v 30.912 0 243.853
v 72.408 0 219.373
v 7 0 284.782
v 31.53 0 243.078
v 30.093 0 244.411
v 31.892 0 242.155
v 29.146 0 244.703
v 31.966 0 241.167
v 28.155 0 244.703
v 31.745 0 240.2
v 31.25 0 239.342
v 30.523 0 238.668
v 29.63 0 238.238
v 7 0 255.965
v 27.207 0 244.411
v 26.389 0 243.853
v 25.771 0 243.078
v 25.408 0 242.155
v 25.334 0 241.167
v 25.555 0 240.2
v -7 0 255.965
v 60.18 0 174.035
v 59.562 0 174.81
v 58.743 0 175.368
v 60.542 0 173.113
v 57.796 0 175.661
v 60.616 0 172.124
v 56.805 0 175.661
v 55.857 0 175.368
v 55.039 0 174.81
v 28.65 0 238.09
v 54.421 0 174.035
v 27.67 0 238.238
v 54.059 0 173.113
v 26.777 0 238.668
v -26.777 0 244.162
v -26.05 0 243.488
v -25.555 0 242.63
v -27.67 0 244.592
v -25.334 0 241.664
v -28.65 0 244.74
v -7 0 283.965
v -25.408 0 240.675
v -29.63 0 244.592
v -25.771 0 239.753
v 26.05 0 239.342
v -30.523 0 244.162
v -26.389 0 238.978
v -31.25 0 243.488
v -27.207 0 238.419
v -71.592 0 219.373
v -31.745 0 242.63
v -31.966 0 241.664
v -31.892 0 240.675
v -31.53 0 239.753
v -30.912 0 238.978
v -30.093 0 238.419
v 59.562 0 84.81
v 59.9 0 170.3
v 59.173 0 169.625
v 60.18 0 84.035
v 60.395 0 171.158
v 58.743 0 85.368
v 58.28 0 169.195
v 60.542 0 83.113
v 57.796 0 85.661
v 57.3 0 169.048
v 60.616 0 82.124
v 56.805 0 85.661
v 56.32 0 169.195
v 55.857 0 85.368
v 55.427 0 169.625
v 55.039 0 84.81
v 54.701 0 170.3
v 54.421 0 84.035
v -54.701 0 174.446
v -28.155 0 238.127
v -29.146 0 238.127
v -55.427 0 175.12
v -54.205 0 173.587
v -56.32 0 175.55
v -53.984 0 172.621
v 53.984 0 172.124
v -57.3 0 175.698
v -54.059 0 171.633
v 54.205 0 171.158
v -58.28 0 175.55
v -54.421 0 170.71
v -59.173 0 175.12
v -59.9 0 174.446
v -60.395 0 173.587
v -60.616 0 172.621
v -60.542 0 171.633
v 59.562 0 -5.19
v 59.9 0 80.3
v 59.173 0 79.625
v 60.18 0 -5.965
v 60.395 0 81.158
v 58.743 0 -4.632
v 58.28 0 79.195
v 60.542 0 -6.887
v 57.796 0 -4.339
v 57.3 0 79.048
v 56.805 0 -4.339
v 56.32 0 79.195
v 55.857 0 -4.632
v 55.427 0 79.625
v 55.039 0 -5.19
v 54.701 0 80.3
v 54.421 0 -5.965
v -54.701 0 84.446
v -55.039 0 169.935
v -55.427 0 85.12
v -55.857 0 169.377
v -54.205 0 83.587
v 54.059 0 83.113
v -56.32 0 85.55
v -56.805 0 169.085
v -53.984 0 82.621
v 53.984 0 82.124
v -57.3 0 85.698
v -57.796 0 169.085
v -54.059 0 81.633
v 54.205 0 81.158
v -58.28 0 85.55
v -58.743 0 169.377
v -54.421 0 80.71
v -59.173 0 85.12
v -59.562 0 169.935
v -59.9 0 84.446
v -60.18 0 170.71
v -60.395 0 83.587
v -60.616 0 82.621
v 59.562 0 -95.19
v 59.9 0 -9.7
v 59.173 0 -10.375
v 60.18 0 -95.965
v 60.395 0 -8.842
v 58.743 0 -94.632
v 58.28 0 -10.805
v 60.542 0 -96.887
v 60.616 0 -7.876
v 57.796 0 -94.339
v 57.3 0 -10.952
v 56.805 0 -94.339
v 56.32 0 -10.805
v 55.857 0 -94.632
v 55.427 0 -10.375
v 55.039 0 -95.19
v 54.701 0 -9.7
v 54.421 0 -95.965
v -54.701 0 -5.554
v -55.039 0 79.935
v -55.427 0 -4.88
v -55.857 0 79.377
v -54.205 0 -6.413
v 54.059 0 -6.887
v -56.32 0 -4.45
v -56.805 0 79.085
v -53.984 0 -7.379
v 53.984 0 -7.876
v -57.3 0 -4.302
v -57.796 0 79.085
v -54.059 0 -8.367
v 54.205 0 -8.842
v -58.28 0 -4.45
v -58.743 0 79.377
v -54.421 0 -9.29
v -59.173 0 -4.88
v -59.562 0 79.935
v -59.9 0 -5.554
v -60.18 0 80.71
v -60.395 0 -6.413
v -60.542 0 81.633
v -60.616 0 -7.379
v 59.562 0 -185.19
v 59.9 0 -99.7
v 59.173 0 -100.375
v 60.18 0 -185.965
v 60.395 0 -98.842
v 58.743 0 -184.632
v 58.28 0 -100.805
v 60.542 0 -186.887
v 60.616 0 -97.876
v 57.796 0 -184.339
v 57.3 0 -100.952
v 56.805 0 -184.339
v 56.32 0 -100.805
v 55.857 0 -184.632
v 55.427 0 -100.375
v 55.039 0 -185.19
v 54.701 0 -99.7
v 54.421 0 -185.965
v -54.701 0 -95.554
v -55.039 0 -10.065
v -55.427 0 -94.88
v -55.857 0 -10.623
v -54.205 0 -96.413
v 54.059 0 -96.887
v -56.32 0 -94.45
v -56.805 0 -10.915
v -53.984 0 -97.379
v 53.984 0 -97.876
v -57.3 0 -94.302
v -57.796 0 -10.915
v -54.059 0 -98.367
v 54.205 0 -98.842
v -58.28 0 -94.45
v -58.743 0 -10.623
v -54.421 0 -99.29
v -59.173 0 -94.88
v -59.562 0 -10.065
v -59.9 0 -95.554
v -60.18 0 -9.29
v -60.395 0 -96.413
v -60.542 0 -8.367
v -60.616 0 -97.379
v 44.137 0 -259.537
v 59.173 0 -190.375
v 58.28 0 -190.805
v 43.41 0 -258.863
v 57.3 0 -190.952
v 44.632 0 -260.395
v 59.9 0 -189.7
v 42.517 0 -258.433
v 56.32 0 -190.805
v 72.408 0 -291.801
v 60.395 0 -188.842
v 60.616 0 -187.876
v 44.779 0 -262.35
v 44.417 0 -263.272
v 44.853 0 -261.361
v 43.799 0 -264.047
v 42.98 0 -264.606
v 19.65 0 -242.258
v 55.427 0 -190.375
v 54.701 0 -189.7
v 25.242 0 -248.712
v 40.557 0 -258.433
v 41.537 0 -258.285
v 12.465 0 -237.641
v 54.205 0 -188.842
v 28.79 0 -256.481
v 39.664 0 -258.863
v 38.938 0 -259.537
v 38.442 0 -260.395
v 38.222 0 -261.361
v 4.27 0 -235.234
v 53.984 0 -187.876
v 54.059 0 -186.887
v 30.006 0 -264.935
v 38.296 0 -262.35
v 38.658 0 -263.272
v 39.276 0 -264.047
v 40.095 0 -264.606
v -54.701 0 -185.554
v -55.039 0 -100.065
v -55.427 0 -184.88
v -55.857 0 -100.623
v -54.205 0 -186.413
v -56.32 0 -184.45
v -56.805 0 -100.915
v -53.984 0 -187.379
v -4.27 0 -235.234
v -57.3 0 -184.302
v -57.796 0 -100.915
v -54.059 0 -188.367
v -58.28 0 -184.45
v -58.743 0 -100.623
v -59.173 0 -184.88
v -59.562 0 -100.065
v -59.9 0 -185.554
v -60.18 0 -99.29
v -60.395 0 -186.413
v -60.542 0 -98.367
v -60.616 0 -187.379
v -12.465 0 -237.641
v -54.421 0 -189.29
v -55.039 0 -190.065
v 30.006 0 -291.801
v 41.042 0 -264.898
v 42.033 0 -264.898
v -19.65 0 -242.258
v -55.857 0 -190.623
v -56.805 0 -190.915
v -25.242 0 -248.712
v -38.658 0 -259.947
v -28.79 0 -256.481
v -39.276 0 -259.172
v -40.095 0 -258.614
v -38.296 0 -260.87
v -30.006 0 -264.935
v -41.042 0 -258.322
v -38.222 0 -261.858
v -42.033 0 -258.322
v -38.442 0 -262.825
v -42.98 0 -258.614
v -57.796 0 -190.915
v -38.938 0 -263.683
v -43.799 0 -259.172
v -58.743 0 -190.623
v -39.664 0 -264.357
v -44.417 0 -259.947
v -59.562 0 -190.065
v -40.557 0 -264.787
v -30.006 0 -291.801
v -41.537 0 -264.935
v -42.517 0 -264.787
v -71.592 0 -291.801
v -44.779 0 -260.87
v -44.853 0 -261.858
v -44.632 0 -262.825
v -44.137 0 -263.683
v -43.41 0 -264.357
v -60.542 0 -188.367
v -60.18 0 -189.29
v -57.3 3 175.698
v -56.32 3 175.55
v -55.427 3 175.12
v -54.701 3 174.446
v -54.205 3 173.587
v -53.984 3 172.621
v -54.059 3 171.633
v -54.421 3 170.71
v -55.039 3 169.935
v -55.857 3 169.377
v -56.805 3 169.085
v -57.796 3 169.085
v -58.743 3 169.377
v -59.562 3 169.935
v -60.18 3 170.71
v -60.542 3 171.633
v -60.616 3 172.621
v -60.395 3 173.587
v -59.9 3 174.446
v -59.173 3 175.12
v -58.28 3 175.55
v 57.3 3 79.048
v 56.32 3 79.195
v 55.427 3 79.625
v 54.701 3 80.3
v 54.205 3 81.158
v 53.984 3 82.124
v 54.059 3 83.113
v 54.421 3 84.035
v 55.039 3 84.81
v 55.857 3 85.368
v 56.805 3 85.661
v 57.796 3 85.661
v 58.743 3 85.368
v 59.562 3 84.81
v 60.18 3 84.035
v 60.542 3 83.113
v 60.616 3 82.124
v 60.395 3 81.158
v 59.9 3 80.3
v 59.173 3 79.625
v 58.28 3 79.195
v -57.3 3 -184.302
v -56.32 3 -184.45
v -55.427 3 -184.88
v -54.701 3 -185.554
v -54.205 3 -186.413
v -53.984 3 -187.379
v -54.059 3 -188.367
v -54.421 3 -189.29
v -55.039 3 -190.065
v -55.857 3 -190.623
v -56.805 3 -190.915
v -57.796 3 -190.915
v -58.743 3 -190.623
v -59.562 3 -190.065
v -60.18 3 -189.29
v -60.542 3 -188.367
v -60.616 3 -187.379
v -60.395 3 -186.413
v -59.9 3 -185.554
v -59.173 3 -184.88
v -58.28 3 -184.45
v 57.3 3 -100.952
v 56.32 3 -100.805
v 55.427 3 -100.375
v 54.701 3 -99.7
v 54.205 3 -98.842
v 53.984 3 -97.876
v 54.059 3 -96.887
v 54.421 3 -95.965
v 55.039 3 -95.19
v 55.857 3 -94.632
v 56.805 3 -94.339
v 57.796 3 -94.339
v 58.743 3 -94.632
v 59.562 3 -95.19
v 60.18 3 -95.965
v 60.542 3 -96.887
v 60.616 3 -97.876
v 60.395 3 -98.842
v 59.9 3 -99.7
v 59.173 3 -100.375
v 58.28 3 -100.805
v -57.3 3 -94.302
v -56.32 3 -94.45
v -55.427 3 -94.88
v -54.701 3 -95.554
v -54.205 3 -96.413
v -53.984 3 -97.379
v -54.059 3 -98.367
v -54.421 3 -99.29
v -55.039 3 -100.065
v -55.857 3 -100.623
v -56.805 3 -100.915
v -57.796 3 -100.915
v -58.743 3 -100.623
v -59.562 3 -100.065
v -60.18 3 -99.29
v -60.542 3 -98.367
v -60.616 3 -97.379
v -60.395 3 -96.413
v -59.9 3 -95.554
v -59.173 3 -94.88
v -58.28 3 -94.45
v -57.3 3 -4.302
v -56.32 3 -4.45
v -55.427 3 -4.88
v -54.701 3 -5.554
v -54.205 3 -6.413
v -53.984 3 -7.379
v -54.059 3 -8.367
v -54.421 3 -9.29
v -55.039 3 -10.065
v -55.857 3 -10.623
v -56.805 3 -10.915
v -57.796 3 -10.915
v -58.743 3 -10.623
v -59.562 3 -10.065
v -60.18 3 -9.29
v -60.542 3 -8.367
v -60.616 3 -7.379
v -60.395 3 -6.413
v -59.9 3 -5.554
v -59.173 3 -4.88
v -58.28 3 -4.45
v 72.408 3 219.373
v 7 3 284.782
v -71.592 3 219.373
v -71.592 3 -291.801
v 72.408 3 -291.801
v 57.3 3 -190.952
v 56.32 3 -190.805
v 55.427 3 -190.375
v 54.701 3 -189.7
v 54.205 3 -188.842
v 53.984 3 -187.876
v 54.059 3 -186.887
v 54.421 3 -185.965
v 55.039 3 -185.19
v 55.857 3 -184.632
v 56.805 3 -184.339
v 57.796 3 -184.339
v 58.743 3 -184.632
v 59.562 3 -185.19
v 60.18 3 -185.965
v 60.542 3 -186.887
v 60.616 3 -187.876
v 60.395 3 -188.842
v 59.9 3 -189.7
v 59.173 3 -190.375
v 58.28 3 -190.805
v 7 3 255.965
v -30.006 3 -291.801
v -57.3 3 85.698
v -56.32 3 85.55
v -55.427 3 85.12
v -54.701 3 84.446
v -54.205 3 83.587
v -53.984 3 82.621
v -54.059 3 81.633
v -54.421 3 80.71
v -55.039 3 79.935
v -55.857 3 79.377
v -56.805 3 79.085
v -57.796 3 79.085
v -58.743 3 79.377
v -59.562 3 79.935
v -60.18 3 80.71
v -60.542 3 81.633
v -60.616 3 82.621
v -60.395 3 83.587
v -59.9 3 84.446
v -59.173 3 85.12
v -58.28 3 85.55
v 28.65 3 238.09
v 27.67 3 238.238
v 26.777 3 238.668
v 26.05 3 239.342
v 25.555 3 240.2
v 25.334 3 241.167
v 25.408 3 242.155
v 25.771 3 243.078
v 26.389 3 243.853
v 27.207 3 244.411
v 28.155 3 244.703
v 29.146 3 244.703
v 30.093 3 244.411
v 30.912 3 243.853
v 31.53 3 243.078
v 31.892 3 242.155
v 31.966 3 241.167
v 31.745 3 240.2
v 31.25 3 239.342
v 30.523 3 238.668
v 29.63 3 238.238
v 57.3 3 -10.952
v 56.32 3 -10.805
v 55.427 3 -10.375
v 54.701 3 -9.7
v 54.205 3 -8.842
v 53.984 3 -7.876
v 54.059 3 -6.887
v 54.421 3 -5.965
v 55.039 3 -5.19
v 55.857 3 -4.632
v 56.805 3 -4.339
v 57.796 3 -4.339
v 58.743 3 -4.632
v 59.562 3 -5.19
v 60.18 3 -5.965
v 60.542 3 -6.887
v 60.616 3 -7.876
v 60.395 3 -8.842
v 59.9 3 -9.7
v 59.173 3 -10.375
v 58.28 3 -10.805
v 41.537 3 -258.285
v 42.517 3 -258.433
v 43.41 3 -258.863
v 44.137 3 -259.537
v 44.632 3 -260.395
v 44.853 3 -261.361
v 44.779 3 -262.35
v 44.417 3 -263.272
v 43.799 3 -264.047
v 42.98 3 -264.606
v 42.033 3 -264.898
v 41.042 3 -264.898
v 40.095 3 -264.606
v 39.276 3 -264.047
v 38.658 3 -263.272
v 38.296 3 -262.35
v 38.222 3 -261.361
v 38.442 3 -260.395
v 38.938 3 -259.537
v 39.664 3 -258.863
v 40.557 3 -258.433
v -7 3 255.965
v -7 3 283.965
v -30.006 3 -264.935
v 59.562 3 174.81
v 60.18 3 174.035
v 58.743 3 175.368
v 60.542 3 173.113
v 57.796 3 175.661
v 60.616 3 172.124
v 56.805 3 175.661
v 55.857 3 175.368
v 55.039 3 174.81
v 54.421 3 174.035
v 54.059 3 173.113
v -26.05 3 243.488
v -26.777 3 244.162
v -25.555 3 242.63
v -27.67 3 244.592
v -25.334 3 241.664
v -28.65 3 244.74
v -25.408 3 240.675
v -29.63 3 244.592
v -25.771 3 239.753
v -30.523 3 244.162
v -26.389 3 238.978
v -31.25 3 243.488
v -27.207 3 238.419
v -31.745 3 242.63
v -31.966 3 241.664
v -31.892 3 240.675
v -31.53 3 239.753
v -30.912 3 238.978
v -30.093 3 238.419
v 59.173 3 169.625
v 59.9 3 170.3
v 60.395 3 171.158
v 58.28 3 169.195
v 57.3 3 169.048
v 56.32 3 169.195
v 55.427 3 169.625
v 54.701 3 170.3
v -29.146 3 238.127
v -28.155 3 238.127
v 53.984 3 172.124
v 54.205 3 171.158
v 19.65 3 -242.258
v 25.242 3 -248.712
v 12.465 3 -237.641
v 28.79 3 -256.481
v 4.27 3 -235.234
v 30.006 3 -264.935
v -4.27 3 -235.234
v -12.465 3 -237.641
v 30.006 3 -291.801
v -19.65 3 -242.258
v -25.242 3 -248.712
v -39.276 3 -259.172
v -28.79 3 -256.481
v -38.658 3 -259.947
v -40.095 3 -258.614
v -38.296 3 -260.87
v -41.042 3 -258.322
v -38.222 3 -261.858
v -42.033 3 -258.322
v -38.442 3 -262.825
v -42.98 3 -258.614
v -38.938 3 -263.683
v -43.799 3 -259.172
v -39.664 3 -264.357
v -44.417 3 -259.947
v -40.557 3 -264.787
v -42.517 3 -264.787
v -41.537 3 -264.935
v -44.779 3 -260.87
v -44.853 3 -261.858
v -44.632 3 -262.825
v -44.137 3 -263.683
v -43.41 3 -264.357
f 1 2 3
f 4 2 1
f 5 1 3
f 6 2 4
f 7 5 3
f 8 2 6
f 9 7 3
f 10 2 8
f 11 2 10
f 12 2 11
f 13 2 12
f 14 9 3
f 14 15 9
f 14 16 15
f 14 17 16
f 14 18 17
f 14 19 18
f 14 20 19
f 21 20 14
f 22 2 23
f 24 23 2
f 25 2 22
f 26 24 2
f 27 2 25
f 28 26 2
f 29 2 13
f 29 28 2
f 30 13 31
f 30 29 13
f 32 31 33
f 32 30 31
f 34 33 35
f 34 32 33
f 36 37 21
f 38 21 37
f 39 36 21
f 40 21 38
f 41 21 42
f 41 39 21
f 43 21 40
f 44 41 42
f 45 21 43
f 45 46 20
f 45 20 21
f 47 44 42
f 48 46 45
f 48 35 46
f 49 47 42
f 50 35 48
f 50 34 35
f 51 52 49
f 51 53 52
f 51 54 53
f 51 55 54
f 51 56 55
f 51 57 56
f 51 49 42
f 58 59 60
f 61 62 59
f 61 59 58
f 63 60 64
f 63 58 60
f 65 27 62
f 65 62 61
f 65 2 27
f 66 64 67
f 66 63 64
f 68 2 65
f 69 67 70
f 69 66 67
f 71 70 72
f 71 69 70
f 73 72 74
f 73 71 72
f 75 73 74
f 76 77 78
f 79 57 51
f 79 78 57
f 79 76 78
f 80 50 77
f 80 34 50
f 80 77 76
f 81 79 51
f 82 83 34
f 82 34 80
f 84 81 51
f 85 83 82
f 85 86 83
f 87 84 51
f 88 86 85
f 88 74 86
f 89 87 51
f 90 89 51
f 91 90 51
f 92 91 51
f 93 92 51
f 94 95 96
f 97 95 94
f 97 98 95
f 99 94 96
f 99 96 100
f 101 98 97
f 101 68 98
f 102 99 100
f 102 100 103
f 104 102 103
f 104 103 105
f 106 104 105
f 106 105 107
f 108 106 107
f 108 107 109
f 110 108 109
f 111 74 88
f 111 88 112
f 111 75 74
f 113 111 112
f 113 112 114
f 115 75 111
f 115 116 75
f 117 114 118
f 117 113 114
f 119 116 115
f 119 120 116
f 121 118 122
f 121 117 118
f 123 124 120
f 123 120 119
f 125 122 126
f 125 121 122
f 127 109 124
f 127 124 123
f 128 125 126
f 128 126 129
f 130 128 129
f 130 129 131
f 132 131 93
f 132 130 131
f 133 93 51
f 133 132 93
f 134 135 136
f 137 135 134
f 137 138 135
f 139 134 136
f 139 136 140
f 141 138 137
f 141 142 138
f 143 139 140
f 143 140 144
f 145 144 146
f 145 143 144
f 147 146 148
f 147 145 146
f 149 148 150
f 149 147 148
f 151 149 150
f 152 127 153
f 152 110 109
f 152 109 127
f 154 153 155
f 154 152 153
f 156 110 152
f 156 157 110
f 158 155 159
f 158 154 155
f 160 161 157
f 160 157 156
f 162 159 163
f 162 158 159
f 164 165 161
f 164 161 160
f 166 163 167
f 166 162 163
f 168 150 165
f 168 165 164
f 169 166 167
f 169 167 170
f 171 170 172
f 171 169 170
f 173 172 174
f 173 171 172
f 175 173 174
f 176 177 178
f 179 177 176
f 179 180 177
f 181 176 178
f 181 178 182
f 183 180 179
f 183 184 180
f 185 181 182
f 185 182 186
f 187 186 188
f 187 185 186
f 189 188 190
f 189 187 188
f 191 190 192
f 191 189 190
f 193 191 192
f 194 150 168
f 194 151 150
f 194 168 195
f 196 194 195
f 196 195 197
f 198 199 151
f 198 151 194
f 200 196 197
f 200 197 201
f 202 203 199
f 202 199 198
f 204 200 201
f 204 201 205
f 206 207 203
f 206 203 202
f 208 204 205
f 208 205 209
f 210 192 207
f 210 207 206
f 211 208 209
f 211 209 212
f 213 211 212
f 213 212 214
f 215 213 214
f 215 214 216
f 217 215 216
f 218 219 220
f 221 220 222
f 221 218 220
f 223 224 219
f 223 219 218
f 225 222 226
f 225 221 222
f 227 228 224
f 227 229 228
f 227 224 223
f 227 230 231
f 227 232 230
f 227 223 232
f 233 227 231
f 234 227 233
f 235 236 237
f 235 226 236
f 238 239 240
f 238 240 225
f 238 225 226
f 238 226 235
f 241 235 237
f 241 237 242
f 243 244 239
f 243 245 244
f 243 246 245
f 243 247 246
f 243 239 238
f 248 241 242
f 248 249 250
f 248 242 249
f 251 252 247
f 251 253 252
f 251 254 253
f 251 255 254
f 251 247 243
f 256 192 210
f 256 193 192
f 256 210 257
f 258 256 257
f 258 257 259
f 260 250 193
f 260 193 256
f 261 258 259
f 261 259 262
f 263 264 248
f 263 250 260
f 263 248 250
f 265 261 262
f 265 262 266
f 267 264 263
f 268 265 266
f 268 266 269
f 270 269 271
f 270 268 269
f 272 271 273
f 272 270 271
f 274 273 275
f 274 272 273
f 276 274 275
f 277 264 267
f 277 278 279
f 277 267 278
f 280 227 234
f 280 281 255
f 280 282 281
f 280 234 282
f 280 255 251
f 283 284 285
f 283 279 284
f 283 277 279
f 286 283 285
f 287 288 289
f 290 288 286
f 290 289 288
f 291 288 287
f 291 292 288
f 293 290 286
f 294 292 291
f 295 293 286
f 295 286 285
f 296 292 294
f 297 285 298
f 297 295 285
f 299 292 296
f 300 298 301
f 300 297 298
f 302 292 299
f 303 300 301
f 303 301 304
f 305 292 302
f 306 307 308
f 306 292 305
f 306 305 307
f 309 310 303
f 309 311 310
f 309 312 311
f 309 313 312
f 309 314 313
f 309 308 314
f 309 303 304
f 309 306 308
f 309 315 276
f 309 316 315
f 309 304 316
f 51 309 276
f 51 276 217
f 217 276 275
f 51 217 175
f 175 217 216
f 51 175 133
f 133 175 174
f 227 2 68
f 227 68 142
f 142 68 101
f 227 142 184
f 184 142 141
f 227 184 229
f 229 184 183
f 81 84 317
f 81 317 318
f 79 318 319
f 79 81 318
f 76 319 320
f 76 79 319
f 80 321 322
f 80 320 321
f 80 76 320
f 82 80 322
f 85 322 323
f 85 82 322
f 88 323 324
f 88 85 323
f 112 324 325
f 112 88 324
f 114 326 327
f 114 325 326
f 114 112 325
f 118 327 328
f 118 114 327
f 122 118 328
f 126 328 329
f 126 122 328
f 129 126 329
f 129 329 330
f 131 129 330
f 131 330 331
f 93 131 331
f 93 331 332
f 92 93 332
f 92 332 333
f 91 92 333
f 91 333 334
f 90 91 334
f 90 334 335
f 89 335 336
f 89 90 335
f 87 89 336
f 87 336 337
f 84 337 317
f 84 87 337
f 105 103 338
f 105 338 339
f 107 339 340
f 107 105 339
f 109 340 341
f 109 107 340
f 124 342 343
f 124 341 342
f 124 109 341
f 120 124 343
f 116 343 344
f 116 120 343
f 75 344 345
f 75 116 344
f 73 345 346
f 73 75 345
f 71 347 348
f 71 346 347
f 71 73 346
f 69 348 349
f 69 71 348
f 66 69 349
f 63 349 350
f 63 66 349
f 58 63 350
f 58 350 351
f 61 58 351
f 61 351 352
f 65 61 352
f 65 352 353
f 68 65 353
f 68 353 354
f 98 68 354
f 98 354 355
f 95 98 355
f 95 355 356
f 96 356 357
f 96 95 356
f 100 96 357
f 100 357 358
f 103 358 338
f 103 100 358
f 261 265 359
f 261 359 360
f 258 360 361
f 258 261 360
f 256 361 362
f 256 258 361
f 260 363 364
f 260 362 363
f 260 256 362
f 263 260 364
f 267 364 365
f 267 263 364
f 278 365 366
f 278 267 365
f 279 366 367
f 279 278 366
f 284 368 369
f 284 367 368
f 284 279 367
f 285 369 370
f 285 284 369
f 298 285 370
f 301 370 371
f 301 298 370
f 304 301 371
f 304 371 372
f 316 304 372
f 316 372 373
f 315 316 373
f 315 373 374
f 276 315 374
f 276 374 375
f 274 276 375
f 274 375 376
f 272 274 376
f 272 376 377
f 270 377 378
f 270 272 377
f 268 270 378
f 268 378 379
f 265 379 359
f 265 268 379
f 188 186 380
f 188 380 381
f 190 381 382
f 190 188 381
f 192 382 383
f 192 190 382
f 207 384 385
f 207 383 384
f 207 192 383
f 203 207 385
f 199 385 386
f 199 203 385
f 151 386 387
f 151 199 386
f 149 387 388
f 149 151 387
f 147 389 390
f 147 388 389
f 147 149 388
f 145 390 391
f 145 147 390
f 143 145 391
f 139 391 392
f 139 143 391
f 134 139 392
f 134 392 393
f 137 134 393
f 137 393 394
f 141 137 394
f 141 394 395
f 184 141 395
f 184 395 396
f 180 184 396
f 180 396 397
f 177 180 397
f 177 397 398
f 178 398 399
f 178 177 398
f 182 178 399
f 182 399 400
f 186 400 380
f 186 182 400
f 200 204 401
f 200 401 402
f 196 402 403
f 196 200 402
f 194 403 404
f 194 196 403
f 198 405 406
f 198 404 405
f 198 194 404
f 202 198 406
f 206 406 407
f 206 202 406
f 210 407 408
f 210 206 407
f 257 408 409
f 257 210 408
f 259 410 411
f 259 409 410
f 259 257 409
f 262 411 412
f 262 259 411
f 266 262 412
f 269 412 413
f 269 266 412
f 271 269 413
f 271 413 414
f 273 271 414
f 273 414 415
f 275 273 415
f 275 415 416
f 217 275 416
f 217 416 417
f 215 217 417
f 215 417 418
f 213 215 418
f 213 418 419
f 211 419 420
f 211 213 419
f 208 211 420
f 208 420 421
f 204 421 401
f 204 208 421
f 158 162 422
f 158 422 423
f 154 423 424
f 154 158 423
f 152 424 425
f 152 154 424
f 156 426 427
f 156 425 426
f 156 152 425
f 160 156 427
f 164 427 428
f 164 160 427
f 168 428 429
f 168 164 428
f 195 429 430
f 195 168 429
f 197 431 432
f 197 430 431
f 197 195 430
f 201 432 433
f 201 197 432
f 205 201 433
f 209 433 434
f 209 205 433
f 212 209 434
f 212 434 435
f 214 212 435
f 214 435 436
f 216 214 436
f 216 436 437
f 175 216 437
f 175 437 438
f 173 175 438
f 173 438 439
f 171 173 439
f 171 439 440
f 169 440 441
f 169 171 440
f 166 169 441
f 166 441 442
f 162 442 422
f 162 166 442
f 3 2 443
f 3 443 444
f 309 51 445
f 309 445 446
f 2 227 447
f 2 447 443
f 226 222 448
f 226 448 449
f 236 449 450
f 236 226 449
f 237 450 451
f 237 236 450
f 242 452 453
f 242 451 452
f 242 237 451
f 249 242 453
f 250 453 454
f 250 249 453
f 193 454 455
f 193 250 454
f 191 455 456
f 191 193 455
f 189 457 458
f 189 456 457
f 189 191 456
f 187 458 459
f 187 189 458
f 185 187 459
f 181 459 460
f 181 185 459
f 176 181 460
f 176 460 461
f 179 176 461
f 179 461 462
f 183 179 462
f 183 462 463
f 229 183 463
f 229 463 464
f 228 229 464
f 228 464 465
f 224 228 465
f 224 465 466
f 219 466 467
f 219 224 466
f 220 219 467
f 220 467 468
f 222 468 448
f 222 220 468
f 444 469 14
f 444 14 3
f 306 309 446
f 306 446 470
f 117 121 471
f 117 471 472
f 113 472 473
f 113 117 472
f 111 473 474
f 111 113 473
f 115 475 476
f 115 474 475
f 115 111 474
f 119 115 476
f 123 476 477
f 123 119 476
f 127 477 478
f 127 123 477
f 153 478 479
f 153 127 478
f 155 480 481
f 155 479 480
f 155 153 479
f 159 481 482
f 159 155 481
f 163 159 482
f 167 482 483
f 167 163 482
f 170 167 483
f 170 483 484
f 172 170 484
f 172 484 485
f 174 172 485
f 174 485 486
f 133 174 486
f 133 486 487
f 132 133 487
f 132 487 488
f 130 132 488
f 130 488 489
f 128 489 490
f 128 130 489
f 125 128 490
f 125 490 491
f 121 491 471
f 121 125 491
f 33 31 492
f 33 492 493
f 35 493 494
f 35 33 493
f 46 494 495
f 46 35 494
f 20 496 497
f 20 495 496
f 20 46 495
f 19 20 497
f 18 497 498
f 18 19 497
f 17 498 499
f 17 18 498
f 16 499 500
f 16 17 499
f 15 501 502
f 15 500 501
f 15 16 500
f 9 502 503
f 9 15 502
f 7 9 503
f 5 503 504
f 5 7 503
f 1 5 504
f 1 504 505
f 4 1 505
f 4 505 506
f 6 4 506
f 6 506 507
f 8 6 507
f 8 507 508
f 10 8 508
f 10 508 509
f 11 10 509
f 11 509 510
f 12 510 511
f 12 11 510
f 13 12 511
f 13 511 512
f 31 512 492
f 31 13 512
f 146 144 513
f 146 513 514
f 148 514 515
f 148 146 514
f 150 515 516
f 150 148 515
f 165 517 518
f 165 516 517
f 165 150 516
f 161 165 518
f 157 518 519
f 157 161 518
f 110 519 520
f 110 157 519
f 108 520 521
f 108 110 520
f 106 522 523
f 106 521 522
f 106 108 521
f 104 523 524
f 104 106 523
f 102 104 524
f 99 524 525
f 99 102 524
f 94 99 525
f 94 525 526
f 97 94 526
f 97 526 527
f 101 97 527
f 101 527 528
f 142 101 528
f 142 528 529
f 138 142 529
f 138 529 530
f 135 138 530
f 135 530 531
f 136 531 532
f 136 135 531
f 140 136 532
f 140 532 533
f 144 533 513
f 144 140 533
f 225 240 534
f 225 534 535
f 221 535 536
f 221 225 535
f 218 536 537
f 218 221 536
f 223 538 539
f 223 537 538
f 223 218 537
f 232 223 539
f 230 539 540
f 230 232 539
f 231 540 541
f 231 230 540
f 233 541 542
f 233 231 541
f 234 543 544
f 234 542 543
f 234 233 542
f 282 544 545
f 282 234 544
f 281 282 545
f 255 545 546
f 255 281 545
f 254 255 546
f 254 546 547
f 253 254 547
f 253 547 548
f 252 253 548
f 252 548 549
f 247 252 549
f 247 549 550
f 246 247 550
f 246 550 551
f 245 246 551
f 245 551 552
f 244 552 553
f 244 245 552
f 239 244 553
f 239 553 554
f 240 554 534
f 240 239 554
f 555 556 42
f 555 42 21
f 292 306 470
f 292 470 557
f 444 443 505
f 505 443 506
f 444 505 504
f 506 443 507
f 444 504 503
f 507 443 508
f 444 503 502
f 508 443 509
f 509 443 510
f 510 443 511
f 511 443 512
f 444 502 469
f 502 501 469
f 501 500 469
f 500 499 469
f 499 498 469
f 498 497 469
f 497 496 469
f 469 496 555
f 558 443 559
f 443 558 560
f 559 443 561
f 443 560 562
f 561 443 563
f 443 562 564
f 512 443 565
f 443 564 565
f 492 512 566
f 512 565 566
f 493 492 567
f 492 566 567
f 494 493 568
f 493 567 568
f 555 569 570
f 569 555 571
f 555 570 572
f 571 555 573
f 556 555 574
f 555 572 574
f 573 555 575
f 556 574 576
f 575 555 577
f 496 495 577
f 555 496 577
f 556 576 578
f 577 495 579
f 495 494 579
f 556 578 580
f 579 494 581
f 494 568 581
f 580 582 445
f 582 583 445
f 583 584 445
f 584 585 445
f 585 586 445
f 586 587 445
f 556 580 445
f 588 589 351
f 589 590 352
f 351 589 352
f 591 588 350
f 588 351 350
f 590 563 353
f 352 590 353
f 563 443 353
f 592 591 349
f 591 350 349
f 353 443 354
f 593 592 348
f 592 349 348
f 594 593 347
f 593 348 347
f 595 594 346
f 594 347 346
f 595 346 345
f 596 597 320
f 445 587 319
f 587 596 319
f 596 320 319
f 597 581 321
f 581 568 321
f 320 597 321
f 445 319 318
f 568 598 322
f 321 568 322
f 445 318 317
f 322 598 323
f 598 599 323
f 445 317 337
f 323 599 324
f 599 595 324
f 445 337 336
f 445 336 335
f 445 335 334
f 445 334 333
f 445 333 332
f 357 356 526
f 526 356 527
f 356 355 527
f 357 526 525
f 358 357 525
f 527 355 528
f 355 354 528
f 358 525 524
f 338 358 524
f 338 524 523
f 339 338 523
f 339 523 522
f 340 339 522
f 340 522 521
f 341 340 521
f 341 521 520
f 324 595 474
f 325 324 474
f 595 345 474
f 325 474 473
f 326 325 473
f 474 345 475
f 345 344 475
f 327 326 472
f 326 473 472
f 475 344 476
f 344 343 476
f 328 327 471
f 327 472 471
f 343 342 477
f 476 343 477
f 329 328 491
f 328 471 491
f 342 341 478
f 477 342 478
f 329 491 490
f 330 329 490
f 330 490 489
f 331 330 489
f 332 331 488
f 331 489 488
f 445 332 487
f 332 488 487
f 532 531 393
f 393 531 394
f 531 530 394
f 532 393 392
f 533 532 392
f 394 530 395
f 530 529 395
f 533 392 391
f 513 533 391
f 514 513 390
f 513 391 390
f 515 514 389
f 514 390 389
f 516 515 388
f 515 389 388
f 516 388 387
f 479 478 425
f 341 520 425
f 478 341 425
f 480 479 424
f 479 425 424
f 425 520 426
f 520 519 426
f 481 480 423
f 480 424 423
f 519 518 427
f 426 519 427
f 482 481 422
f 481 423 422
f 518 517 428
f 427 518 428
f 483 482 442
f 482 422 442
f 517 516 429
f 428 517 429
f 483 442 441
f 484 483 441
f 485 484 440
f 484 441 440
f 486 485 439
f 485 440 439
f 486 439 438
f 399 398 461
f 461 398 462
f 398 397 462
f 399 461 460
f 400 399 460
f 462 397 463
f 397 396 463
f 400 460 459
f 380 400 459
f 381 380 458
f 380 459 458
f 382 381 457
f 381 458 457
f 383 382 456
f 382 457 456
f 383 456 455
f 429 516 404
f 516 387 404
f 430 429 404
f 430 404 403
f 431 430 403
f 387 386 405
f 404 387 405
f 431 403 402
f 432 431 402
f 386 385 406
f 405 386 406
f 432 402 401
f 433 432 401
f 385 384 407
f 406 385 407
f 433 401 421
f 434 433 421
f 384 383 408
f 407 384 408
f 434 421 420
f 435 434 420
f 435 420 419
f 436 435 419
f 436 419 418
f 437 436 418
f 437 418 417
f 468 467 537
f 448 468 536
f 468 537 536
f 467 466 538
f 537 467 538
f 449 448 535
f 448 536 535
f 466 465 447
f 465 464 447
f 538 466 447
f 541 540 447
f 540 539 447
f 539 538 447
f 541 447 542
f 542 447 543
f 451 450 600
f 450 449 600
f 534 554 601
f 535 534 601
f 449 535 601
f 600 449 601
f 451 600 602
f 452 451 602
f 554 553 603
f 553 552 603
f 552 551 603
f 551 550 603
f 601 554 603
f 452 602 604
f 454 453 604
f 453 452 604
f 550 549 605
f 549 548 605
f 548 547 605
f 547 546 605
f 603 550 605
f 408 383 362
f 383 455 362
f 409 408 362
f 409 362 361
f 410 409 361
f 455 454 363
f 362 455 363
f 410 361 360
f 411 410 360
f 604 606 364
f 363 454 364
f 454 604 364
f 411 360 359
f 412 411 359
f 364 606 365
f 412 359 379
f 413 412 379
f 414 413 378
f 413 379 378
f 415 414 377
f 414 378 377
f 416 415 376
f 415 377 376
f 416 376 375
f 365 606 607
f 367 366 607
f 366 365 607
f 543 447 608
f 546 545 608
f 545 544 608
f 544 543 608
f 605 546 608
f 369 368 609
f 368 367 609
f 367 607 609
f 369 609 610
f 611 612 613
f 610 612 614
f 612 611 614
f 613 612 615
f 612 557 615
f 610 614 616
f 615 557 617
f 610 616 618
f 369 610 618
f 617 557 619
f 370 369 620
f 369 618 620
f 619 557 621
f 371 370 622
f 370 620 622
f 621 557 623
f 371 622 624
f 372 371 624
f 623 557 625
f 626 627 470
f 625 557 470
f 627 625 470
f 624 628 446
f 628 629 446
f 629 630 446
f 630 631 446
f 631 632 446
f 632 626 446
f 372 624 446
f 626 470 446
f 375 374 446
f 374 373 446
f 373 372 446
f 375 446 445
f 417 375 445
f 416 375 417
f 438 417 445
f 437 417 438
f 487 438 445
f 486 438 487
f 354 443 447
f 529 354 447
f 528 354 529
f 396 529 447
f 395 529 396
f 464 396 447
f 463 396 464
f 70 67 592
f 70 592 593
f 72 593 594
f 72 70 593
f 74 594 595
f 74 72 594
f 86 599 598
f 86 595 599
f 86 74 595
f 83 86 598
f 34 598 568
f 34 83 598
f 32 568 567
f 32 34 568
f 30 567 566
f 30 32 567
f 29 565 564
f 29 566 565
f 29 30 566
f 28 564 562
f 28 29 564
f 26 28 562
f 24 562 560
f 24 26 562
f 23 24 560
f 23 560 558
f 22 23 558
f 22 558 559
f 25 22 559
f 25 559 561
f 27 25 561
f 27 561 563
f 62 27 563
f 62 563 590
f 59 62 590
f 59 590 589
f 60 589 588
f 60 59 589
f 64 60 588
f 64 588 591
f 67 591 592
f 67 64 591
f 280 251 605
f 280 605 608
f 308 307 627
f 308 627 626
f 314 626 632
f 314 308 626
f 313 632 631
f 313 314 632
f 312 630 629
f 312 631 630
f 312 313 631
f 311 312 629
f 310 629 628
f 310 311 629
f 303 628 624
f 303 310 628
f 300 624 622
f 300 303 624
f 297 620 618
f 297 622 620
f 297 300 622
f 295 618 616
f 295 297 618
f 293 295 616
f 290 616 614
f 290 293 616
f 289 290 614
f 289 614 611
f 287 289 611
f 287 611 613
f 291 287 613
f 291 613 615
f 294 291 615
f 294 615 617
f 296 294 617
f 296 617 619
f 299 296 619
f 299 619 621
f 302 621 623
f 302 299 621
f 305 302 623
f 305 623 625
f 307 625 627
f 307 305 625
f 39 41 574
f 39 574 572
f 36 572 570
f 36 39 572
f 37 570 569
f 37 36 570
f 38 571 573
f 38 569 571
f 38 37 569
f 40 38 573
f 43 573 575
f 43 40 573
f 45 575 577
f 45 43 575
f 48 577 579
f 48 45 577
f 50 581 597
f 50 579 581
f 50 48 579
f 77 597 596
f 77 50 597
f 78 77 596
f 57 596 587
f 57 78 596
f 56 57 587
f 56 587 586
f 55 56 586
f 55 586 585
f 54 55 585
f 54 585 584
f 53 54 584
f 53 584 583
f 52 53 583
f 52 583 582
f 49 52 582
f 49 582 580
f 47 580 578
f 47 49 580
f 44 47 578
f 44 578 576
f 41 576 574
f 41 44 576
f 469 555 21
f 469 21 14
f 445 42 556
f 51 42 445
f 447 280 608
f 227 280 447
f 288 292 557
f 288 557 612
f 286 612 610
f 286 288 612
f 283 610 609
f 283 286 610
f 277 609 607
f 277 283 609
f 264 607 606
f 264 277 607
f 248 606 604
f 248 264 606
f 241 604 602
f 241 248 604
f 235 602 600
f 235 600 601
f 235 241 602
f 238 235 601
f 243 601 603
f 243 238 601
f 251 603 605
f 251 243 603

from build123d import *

# Parameters (mm, degrees)
BOSS_EXTRUDE2_DEPTH     = 3
CUT_EXTRUDE1_DEPTH      = 301.665110986
CUT_EXTRUDE2_DEPTH      = 301.665110986
CUT_EXTRUDE2_DEPTH_BACK = 301.665110986
SKETCH5_R               = 3.325


with BuildPart() as part:
    # Sketch3 → Boss-Extrude2 (new body)
    with BuildSketch(Plane(origin=(0, 0, 0), x_dir=(1, 0, 0), z_dir=(0, 1, 0))):
        with BuildLine():
            Line((-71.592001125, 291.800526166), (-30.005764519, 291.800526166))
            Line((-30.005764519, 291.800526166), (-30.005764519, 264.934819646))
            ThreePointArc((-30.005764519, 264.934819646), (0, 234.929055126), (30.005764519, 264.934819646))
            Line((30.005764519, 264.934819646), (30.005764519, 291.800526166))
            Line((30.005764519, 291.800526166), (72.408299895, 291.800526166))
            Line((72.408299895, 291.800526166), (72.408299895, -219.373421964))
            Line((72.408299895, -219.373421964), (0.408149385, -291.373572474))
            Line((0.408149385, -291.373572474), (-71.592001125, -219.373421964))
            Line((-71.592001125, -219.373421964), (-71.592001125, 291.800526166))
        make_face()
    extrude(amount=BOSS_EXTRUDE2_DEPTH)

    # Sketch4 → Cut-Extrude1 (cut, through all)
    with BuildSketch(Plane(origin=(0, 3, 0), x_dir=(1, 0, 0), z_dir=(0, 1, 0))):
        Polygon((-7, -283.965423089), (-7, -255.965423089), (7, -255.965423089), (7, -284.781721859), (0.408149385, -291.373572474), align=None)
    extrude(amount=-CUT_EXTRUDE1_DEPTH, mode=Mode.SUBTRACT)

    # Sketch5 → Cut-Extrude2 (cut, two sides: drawn at the far end of the back side and taken through both)
    with BuildSketch(Plane(origin=(0, 3, 0), x_dir=(1, 0, 0), z_dir=(0, 1, 0)).offset(-CUT_EXTRUDE2_DEPTH_BACK)):
        with Locations(Location((-28.65007526, -241.415105099, 0), (0, 0, 270))):
            Circle(SKETCH5_R)
        with Locations(Location((-57.30015051, -172.372698109, 0), (0, 0, 270))):
            Circle(SKETCH5_R)
        with Locations(Location((-57.30015051, -82.372698109, 0), (0, 0, 270))):
            Circle(SKETCH5_R)
        with Locations(Location((-57.30015051, 7.627301891, 0), (0, 0, 270))):
            Circle(SKETCH5_R)
        with Locations(Location((-57.30015051, 97.627301891, 0), (0, 0, 270))):
            Circle(SKETCH5_R)
        with Locations(Location((-57.30015051, 187.627301891, 0), (0, 0, 270))):
            Circle(SKETCH5_R)
        with Locations(Location((57.30015051, 187.627301891, 0), (0, 0, 90))):
            Circle(SKETCH5_R)
        with Locations(Location((57.30015051, 97.627301891, 0), (0, 0, 90))):
            Circle(SKETCH5_R)
        with Locations(Location((57.30015051, -82.372698109, 0), (0, 0, 90))):
            Circle(SKETCH5_R)
        with Locations(Location((57.30015051, -172.372698109, 0), (0, 0, 90))):
            Circle(SKETCH5_R)
        with Locations(Location((57.30015051, 7.627301891, 0), (0, 0, 90))):
            Circle(SKETCH5_R)
        with Locations(Location((28.65007526, -241.415105099, 0), (0, 0, 90))):
            Circle(SKETCH5_R)
        with Locations(Location((41.537257894, 261.609819636, 0), (0, 0, 270))):
            Circle(SKETCH5_R)
        with Locations(Location((-41.537257894, 261.609819636, 0), (0, 0, 90))):
            Circle(SKETCH5_R)
    extrude(amount=CUT_EXTRUDE2_DEPTH + CUT_EXTRUDE2_DEPTH_BACK, mode=Mode.SUBTRACT)


solid = part.part
